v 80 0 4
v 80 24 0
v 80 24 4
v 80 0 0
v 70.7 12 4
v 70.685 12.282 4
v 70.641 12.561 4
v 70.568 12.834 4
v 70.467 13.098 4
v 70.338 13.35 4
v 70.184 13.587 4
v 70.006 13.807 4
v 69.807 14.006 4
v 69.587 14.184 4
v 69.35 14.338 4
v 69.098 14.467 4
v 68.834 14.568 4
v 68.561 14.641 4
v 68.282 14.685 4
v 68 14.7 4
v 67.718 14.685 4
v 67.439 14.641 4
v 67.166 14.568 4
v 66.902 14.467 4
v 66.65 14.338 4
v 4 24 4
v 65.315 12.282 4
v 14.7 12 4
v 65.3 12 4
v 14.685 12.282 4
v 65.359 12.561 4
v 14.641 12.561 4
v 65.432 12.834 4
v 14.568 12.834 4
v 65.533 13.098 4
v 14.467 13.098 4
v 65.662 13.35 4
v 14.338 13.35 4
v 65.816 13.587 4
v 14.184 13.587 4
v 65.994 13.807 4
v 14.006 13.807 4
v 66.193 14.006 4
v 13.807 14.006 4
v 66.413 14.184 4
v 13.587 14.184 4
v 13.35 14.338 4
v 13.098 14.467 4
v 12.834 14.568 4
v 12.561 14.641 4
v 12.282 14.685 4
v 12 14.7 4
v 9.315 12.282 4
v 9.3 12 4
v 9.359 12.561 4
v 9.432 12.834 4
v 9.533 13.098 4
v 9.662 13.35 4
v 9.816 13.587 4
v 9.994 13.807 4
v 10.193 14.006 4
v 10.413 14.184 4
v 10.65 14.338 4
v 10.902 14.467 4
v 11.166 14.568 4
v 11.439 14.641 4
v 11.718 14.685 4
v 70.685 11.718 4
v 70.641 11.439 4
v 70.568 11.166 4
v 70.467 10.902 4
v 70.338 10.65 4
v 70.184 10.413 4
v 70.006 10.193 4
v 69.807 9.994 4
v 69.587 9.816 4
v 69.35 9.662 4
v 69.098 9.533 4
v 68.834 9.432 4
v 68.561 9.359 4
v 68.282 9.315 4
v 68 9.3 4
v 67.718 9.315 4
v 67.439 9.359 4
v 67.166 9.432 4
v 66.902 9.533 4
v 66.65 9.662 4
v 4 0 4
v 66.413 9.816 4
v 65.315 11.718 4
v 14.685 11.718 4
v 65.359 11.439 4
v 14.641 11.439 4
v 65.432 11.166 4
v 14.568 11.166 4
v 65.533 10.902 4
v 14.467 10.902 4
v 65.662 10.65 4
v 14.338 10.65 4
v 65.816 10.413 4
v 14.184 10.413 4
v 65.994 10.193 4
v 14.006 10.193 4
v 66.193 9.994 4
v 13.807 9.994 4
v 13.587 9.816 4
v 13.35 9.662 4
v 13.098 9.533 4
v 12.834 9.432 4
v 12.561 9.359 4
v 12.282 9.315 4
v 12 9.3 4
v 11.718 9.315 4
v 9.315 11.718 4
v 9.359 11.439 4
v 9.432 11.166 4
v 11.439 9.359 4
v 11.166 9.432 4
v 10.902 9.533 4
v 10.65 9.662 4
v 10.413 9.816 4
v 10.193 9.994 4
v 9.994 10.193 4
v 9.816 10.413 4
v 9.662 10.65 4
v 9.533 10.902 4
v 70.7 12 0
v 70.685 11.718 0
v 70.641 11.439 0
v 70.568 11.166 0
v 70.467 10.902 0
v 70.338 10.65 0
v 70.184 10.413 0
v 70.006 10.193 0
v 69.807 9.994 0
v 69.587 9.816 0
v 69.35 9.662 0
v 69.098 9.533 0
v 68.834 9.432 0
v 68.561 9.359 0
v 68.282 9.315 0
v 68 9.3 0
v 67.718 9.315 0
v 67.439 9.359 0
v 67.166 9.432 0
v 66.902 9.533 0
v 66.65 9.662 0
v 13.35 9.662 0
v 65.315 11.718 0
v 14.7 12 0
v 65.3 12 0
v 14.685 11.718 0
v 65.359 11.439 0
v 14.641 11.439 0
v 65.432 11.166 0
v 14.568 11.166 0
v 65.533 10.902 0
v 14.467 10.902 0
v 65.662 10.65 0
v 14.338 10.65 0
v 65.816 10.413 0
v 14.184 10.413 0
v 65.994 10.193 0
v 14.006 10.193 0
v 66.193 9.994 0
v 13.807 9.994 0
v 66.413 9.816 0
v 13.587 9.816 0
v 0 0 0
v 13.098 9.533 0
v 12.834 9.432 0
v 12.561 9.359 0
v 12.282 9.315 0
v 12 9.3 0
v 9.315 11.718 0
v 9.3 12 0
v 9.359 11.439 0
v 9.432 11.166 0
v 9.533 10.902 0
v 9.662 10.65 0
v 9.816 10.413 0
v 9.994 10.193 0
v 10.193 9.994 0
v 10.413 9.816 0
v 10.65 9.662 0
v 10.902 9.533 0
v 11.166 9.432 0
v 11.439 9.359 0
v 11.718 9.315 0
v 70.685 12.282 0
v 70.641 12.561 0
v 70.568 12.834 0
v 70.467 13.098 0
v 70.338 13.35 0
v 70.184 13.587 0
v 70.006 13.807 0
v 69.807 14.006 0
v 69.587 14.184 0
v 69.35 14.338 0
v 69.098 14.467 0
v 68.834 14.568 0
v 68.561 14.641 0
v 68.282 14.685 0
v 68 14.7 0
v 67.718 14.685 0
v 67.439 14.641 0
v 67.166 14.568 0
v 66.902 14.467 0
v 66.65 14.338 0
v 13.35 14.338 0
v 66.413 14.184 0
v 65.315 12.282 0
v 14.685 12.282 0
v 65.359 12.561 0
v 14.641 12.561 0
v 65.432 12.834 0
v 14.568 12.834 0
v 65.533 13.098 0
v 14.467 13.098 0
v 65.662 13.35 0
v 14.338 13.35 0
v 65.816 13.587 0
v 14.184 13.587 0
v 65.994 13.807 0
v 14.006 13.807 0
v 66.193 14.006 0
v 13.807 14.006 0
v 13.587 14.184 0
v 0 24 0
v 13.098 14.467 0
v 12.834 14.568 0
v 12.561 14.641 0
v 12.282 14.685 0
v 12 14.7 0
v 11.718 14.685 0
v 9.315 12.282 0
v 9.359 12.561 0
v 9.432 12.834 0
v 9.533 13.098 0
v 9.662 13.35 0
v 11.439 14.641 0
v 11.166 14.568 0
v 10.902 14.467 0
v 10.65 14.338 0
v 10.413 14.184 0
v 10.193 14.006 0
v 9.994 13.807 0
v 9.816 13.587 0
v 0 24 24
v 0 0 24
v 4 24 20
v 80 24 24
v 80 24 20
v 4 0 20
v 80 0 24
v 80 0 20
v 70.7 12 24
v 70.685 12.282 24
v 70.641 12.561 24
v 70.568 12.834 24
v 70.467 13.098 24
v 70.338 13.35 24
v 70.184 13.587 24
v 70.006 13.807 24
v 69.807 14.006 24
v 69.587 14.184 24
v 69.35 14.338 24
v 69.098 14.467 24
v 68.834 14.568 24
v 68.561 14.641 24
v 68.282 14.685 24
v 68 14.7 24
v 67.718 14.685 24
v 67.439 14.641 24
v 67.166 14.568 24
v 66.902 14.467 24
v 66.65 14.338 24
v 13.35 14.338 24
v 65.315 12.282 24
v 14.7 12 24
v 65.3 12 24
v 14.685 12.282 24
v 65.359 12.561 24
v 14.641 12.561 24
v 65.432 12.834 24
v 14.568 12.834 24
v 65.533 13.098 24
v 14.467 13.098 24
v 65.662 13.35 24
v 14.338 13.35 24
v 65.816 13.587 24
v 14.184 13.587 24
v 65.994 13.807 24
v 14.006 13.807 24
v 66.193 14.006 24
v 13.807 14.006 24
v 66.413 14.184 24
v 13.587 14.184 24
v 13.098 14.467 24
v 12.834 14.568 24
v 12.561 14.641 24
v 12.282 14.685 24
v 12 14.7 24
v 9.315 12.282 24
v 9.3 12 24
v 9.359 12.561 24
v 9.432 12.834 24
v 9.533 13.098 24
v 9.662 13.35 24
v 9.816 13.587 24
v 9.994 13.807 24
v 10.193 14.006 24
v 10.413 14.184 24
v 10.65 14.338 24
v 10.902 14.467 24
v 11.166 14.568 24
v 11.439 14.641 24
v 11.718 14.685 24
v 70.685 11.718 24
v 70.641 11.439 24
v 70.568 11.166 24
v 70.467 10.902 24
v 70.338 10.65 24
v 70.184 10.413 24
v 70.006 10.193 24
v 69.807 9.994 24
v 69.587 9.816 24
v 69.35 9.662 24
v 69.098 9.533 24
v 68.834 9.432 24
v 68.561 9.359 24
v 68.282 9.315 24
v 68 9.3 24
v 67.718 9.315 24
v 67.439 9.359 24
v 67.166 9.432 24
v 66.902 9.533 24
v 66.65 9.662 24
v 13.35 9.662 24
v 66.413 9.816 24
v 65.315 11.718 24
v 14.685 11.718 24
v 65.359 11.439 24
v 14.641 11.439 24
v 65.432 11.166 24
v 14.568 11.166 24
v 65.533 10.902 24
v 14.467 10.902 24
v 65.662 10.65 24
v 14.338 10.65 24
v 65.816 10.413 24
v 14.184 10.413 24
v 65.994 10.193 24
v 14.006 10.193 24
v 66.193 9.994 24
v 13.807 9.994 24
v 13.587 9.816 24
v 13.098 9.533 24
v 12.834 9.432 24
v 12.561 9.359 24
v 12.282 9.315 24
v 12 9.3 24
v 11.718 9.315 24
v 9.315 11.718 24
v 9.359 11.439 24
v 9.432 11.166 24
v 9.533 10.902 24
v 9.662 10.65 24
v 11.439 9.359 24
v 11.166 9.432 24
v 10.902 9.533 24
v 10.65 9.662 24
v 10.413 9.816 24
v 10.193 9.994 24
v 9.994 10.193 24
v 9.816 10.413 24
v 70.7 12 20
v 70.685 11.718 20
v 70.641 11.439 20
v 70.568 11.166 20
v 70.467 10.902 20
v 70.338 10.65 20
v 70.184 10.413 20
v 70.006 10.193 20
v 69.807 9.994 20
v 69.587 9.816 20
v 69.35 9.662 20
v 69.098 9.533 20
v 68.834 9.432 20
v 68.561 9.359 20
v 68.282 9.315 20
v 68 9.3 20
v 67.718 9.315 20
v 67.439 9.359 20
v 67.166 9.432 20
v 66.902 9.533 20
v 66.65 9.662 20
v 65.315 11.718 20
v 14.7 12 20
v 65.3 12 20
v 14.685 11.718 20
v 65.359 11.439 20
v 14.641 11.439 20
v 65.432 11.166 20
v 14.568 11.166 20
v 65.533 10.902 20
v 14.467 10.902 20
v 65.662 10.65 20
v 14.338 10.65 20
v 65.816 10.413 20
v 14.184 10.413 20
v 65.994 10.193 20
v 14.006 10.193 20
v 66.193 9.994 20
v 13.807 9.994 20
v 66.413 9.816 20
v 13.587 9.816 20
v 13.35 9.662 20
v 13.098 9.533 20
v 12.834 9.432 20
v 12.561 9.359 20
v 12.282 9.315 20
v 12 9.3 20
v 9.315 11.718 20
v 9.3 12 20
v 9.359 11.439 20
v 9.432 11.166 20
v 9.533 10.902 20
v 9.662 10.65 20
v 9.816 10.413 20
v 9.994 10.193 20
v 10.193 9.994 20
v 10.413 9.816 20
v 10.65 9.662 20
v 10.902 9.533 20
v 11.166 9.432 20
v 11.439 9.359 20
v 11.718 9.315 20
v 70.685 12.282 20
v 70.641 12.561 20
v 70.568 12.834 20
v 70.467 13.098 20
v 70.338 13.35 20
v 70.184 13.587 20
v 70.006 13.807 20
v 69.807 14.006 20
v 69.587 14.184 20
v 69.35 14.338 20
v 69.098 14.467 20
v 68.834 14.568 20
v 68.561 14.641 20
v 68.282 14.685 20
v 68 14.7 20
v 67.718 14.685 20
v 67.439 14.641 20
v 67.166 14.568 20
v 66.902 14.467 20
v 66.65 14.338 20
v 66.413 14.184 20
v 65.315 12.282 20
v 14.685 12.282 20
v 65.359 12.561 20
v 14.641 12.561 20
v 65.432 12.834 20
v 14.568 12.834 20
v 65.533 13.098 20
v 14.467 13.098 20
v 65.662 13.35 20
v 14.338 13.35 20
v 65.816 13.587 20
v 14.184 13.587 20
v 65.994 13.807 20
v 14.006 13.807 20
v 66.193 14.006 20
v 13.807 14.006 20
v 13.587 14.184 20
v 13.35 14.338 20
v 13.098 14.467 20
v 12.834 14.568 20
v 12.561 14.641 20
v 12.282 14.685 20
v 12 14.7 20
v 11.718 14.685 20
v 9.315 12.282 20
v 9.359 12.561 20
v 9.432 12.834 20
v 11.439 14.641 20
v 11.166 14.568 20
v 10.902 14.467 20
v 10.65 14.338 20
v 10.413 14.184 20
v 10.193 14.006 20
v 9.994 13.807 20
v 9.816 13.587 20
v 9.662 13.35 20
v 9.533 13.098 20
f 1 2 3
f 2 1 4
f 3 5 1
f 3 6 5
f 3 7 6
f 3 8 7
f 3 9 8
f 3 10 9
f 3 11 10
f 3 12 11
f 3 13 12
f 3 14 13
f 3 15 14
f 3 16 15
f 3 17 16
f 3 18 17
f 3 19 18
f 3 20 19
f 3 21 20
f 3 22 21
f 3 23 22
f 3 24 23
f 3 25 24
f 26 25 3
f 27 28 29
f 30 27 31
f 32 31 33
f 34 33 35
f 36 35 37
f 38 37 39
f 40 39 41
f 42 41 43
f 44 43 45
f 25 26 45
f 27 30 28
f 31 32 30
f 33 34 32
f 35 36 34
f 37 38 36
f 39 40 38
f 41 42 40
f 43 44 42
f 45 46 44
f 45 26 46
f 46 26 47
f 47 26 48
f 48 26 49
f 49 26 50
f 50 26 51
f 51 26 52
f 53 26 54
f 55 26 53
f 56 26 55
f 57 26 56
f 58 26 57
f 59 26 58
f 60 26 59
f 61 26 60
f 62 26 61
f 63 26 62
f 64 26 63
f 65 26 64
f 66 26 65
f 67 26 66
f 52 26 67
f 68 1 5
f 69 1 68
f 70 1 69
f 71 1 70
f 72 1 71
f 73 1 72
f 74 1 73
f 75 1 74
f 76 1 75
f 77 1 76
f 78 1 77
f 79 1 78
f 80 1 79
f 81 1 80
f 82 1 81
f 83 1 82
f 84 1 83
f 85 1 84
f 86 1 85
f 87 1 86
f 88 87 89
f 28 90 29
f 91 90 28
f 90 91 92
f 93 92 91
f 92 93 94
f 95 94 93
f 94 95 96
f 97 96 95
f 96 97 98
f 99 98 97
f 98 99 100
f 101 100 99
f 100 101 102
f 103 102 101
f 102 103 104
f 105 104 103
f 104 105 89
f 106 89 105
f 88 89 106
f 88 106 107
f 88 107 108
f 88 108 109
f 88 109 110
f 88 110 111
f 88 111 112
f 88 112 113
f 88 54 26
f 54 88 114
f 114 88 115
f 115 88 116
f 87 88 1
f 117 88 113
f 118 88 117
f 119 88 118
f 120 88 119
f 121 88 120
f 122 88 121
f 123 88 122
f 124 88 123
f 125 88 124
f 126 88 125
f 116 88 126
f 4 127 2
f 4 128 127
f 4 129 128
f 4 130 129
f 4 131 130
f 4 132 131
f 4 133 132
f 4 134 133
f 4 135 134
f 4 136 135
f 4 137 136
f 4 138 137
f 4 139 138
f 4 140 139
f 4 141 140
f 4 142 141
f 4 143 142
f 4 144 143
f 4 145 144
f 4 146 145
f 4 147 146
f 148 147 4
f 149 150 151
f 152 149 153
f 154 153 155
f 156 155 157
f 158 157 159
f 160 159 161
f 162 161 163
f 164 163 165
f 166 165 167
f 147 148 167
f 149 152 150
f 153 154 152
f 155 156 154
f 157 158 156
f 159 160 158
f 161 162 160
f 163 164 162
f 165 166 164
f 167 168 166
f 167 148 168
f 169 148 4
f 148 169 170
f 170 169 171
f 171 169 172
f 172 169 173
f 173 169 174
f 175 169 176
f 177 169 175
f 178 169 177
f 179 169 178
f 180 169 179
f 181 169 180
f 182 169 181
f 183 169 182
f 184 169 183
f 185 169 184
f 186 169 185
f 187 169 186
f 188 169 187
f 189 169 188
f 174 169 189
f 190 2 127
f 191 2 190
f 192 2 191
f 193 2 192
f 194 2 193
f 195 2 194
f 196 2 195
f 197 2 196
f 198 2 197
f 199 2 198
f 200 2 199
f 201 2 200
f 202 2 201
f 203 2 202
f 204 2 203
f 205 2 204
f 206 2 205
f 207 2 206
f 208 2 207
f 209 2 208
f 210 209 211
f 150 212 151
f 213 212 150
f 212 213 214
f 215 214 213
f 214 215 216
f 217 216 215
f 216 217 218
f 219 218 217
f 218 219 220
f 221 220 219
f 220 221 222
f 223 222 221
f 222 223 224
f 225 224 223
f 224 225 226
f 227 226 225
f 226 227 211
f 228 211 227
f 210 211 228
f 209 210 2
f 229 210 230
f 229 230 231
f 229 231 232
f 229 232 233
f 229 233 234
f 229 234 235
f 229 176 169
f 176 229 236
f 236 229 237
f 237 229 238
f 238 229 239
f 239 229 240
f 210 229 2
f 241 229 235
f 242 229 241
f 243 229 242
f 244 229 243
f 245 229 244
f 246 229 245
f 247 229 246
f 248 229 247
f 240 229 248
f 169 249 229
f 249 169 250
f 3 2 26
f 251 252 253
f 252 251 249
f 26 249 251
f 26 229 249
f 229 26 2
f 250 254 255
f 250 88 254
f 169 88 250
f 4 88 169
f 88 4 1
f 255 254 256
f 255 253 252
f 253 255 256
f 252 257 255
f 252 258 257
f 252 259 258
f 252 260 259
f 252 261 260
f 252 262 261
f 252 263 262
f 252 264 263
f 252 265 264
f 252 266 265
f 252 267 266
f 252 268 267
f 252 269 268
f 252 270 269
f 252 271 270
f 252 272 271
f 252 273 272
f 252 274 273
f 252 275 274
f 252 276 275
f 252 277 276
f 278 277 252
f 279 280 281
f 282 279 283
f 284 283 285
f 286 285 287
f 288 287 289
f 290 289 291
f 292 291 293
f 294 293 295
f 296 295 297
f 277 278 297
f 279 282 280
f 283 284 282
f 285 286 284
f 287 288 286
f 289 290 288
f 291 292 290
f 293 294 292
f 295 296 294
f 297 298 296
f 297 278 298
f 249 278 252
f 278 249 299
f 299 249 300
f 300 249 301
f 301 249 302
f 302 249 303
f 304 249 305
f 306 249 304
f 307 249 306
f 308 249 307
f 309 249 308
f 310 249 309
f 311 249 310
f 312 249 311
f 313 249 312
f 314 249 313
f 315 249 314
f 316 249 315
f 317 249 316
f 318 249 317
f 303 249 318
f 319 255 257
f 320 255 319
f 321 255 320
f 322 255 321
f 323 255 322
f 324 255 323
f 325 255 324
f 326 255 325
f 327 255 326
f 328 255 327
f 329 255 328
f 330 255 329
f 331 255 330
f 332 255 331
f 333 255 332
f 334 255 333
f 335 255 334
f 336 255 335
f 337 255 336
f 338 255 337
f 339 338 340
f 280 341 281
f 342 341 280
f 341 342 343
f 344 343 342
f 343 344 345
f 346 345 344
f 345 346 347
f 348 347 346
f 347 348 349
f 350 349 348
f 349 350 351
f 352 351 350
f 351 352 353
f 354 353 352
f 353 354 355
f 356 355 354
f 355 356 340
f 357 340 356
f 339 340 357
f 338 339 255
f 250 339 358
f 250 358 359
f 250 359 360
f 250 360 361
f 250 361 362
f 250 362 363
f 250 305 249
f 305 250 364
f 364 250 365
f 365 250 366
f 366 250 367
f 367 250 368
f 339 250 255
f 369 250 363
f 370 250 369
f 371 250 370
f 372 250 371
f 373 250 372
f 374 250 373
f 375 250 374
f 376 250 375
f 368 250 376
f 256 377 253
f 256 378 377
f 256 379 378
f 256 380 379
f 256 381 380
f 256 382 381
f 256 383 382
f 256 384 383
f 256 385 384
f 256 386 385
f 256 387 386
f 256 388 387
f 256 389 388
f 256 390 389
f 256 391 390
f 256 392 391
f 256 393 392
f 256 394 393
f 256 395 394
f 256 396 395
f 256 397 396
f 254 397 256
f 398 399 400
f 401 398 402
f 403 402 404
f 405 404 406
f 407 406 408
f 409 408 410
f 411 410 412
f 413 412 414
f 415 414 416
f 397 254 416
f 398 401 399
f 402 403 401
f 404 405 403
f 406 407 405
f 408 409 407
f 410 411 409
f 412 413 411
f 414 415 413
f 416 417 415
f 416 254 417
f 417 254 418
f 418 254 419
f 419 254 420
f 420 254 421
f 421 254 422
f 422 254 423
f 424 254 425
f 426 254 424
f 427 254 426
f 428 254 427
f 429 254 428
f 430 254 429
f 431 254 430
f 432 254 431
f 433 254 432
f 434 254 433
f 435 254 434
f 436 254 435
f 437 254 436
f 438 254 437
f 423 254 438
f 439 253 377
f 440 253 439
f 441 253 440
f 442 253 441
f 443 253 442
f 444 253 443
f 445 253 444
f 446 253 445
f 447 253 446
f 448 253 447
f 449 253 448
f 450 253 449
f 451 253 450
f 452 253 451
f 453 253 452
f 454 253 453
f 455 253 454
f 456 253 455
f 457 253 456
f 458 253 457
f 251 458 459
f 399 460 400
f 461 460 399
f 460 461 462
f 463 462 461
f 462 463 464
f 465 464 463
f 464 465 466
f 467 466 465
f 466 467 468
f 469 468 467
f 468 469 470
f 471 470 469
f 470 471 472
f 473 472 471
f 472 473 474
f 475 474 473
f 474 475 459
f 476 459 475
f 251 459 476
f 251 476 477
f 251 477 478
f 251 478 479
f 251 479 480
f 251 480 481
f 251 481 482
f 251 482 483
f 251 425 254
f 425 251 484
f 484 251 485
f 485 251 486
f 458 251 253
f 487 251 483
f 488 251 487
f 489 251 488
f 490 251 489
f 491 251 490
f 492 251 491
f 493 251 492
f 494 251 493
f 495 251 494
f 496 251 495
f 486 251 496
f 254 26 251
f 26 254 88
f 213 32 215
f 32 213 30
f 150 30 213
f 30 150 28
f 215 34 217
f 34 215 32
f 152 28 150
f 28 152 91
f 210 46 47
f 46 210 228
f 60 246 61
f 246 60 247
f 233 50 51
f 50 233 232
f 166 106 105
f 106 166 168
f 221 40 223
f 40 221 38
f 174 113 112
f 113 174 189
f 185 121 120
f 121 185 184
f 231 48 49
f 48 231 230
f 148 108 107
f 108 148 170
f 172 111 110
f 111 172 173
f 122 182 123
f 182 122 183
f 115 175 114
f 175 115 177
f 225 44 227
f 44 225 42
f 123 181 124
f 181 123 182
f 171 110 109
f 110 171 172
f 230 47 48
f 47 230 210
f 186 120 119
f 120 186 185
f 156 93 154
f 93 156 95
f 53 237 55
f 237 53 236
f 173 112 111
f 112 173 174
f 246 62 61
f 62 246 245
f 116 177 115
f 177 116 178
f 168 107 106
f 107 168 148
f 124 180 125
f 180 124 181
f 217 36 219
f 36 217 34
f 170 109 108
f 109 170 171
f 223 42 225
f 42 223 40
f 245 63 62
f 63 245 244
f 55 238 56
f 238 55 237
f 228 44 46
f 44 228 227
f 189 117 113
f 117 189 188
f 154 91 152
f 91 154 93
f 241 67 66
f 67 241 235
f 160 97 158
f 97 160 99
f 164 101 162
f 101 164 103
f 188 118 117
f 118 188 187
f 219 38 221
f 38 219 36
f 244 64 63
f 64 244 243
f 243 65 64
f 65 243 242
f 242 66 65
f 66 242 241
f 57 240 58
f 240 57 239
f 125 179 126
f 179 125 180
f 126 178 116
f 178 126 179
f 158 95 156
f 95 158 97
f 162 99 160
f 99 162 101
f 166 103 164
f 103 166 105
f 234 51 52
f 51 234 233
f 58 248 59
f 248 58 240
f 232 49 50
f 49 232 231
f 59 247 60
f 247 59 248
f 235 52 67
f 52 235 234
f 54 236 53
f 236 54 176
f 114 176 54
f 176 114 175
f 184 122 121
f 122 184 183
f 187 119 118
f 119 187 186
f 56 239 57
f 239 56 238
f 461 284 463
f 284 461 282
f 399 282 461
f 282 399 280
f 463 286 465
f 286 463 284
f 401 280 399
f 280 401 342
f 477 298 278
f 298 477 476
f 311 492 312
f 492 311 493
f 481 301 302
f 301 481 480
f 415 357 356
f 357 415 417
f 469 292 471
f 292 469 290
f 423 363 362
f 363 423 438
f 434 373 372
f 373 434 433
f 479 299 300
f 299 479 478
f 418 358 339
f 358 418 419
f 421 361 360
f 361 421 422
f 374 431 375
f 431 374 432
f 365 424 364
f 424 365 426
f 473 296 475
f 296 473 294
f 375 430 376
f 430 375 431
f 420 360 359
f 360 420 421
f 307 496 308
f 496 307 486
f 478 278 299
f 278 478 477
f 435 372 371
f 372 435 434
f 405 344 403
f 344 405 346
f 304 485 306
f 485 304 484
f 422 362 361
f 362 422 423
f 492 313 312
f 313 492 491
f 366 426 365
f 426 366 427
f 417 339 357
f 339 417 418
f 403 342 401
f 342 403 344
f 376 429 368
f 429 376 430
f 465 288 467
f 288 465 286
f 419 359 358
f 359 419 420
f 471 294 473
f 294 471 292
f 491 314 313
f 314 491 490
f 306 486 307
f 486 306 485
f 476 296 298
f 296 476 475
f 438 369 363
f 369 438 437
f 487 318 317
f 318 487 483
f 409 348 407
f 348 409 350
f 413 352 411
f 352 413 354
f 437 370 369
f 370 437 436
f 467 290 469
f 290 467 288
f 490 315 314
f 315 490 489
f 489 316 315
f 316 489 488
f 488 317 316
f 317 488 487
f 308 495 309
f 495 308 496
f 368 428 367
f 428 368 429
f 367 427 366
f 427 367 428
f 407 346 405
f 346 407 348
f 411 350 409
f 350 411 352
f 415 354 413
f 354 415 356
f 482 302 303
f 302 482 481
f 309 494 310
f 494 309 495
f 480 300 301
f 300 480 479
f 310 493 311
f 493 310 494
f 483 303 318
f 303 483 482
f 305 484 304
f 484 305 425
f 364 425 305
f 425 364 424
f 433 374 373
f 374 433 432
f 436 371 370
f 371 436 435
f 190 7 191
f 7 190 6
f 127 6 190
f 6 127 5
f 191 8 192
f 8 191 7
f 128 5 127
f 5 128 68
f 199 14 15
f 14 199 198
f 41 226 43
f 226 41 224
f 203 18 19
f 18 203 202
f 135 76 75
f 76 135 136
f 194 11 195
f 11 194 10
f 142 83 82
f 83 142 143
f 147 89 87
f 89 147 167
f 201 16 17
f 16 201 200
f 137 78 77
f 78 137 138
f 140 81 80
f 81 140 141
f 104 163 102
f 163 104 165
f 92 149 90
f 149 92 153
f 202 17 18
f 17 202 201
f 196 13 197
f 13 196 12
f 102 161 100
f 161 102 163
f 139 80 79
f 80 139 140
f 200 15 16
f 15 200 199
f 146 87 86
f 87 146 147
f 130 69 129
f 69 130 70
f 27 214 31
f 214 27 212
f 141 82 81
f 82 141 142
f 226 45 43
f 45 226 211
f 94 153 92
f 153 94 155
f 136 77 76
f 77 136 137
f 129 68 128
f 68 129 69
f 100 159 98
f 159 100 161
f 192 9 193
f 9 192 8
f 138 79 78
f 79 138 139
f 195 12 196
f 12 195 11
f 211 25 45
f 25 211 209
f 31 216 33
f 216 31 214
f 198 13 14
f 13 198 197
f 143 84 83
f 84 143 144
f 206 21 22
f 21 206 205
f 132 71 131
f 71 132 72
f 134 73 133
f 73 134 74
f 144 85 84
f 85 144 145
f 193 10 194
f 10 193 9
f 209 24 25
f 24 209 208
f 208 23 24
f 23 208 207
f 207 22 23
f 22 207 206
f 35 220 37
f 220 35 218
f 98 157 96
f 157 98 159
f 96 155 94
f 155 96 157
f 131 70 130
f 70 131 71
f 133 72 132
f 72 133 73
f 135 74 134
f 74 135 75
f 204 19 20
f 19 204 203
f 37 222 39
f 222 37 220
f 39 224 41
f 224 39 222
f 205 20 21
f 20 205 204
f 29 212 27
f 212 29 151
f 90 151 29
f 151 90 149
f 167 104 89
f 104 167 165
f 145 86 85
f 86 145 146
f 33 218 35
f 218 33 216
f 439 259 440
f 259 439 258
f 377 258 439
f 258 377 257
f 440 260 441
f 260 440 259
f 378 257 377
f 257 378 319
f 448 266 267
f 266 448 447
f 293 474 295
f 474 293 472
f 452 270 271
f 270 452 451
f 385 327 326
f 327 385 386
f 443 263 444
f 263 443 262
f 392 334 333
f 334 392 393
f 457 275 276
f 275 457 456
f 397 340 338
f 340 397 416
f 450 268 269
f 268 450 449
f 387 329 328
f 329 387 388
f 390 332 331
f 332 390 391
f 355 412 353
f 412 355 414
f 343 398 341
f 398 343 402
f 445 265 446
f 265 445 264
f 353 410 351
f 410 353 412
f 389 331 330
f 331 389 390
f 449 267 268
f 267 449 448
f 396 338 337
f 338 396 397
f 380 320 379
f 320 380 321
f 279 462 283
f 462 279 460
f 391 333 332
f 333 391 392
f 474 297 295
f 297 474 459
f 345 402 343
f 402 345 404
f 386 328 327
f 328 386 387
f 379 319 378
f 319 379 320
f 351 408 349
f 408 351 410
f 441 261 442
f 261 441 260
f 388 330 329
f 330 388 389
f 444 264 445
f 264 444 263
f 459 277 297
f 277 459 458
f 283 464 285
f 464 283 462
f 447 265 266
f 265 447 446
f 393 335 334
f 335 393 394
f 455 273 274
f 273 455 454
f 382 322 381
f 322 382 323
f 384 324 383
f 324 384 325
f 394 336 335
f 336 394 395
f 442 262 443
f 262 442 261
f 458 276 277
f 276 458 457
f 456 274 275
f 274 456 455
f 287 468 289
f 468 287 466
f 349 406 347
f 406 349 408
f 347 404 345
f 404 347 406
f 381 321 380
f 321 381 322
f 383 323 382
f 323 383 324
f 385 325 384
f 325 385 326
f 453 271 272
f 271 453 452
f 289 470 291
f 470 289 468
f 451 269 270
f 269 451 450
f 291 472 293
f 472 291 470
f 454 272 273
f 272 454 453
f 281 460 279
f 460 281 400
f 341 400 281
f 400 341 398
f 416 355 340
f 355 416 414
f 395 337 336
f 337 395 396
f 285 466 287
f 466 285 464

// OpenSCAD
// Z-offset mounting bracket.
$fn = 60;
eps = 0.02;
length = 80;
height = 20;
width = 24;
thickness = 4;
difference() {
    union() {
        cube([length,width,thickness]);
        translate([0,0,height]) cube([length,width,thickness]);
        translate([0,0,thickness]) cube([thickness,width,height-thickness]);
    }
    for (x=[12,length-12]) {
        translate([x,width/2,-eps]) cylinder(d=5.4,h=thickness+2*eps);
        translate([x,width/2,height-eps]) cylinder(d=5.4,h=thickness+2*eps);
    }
}
